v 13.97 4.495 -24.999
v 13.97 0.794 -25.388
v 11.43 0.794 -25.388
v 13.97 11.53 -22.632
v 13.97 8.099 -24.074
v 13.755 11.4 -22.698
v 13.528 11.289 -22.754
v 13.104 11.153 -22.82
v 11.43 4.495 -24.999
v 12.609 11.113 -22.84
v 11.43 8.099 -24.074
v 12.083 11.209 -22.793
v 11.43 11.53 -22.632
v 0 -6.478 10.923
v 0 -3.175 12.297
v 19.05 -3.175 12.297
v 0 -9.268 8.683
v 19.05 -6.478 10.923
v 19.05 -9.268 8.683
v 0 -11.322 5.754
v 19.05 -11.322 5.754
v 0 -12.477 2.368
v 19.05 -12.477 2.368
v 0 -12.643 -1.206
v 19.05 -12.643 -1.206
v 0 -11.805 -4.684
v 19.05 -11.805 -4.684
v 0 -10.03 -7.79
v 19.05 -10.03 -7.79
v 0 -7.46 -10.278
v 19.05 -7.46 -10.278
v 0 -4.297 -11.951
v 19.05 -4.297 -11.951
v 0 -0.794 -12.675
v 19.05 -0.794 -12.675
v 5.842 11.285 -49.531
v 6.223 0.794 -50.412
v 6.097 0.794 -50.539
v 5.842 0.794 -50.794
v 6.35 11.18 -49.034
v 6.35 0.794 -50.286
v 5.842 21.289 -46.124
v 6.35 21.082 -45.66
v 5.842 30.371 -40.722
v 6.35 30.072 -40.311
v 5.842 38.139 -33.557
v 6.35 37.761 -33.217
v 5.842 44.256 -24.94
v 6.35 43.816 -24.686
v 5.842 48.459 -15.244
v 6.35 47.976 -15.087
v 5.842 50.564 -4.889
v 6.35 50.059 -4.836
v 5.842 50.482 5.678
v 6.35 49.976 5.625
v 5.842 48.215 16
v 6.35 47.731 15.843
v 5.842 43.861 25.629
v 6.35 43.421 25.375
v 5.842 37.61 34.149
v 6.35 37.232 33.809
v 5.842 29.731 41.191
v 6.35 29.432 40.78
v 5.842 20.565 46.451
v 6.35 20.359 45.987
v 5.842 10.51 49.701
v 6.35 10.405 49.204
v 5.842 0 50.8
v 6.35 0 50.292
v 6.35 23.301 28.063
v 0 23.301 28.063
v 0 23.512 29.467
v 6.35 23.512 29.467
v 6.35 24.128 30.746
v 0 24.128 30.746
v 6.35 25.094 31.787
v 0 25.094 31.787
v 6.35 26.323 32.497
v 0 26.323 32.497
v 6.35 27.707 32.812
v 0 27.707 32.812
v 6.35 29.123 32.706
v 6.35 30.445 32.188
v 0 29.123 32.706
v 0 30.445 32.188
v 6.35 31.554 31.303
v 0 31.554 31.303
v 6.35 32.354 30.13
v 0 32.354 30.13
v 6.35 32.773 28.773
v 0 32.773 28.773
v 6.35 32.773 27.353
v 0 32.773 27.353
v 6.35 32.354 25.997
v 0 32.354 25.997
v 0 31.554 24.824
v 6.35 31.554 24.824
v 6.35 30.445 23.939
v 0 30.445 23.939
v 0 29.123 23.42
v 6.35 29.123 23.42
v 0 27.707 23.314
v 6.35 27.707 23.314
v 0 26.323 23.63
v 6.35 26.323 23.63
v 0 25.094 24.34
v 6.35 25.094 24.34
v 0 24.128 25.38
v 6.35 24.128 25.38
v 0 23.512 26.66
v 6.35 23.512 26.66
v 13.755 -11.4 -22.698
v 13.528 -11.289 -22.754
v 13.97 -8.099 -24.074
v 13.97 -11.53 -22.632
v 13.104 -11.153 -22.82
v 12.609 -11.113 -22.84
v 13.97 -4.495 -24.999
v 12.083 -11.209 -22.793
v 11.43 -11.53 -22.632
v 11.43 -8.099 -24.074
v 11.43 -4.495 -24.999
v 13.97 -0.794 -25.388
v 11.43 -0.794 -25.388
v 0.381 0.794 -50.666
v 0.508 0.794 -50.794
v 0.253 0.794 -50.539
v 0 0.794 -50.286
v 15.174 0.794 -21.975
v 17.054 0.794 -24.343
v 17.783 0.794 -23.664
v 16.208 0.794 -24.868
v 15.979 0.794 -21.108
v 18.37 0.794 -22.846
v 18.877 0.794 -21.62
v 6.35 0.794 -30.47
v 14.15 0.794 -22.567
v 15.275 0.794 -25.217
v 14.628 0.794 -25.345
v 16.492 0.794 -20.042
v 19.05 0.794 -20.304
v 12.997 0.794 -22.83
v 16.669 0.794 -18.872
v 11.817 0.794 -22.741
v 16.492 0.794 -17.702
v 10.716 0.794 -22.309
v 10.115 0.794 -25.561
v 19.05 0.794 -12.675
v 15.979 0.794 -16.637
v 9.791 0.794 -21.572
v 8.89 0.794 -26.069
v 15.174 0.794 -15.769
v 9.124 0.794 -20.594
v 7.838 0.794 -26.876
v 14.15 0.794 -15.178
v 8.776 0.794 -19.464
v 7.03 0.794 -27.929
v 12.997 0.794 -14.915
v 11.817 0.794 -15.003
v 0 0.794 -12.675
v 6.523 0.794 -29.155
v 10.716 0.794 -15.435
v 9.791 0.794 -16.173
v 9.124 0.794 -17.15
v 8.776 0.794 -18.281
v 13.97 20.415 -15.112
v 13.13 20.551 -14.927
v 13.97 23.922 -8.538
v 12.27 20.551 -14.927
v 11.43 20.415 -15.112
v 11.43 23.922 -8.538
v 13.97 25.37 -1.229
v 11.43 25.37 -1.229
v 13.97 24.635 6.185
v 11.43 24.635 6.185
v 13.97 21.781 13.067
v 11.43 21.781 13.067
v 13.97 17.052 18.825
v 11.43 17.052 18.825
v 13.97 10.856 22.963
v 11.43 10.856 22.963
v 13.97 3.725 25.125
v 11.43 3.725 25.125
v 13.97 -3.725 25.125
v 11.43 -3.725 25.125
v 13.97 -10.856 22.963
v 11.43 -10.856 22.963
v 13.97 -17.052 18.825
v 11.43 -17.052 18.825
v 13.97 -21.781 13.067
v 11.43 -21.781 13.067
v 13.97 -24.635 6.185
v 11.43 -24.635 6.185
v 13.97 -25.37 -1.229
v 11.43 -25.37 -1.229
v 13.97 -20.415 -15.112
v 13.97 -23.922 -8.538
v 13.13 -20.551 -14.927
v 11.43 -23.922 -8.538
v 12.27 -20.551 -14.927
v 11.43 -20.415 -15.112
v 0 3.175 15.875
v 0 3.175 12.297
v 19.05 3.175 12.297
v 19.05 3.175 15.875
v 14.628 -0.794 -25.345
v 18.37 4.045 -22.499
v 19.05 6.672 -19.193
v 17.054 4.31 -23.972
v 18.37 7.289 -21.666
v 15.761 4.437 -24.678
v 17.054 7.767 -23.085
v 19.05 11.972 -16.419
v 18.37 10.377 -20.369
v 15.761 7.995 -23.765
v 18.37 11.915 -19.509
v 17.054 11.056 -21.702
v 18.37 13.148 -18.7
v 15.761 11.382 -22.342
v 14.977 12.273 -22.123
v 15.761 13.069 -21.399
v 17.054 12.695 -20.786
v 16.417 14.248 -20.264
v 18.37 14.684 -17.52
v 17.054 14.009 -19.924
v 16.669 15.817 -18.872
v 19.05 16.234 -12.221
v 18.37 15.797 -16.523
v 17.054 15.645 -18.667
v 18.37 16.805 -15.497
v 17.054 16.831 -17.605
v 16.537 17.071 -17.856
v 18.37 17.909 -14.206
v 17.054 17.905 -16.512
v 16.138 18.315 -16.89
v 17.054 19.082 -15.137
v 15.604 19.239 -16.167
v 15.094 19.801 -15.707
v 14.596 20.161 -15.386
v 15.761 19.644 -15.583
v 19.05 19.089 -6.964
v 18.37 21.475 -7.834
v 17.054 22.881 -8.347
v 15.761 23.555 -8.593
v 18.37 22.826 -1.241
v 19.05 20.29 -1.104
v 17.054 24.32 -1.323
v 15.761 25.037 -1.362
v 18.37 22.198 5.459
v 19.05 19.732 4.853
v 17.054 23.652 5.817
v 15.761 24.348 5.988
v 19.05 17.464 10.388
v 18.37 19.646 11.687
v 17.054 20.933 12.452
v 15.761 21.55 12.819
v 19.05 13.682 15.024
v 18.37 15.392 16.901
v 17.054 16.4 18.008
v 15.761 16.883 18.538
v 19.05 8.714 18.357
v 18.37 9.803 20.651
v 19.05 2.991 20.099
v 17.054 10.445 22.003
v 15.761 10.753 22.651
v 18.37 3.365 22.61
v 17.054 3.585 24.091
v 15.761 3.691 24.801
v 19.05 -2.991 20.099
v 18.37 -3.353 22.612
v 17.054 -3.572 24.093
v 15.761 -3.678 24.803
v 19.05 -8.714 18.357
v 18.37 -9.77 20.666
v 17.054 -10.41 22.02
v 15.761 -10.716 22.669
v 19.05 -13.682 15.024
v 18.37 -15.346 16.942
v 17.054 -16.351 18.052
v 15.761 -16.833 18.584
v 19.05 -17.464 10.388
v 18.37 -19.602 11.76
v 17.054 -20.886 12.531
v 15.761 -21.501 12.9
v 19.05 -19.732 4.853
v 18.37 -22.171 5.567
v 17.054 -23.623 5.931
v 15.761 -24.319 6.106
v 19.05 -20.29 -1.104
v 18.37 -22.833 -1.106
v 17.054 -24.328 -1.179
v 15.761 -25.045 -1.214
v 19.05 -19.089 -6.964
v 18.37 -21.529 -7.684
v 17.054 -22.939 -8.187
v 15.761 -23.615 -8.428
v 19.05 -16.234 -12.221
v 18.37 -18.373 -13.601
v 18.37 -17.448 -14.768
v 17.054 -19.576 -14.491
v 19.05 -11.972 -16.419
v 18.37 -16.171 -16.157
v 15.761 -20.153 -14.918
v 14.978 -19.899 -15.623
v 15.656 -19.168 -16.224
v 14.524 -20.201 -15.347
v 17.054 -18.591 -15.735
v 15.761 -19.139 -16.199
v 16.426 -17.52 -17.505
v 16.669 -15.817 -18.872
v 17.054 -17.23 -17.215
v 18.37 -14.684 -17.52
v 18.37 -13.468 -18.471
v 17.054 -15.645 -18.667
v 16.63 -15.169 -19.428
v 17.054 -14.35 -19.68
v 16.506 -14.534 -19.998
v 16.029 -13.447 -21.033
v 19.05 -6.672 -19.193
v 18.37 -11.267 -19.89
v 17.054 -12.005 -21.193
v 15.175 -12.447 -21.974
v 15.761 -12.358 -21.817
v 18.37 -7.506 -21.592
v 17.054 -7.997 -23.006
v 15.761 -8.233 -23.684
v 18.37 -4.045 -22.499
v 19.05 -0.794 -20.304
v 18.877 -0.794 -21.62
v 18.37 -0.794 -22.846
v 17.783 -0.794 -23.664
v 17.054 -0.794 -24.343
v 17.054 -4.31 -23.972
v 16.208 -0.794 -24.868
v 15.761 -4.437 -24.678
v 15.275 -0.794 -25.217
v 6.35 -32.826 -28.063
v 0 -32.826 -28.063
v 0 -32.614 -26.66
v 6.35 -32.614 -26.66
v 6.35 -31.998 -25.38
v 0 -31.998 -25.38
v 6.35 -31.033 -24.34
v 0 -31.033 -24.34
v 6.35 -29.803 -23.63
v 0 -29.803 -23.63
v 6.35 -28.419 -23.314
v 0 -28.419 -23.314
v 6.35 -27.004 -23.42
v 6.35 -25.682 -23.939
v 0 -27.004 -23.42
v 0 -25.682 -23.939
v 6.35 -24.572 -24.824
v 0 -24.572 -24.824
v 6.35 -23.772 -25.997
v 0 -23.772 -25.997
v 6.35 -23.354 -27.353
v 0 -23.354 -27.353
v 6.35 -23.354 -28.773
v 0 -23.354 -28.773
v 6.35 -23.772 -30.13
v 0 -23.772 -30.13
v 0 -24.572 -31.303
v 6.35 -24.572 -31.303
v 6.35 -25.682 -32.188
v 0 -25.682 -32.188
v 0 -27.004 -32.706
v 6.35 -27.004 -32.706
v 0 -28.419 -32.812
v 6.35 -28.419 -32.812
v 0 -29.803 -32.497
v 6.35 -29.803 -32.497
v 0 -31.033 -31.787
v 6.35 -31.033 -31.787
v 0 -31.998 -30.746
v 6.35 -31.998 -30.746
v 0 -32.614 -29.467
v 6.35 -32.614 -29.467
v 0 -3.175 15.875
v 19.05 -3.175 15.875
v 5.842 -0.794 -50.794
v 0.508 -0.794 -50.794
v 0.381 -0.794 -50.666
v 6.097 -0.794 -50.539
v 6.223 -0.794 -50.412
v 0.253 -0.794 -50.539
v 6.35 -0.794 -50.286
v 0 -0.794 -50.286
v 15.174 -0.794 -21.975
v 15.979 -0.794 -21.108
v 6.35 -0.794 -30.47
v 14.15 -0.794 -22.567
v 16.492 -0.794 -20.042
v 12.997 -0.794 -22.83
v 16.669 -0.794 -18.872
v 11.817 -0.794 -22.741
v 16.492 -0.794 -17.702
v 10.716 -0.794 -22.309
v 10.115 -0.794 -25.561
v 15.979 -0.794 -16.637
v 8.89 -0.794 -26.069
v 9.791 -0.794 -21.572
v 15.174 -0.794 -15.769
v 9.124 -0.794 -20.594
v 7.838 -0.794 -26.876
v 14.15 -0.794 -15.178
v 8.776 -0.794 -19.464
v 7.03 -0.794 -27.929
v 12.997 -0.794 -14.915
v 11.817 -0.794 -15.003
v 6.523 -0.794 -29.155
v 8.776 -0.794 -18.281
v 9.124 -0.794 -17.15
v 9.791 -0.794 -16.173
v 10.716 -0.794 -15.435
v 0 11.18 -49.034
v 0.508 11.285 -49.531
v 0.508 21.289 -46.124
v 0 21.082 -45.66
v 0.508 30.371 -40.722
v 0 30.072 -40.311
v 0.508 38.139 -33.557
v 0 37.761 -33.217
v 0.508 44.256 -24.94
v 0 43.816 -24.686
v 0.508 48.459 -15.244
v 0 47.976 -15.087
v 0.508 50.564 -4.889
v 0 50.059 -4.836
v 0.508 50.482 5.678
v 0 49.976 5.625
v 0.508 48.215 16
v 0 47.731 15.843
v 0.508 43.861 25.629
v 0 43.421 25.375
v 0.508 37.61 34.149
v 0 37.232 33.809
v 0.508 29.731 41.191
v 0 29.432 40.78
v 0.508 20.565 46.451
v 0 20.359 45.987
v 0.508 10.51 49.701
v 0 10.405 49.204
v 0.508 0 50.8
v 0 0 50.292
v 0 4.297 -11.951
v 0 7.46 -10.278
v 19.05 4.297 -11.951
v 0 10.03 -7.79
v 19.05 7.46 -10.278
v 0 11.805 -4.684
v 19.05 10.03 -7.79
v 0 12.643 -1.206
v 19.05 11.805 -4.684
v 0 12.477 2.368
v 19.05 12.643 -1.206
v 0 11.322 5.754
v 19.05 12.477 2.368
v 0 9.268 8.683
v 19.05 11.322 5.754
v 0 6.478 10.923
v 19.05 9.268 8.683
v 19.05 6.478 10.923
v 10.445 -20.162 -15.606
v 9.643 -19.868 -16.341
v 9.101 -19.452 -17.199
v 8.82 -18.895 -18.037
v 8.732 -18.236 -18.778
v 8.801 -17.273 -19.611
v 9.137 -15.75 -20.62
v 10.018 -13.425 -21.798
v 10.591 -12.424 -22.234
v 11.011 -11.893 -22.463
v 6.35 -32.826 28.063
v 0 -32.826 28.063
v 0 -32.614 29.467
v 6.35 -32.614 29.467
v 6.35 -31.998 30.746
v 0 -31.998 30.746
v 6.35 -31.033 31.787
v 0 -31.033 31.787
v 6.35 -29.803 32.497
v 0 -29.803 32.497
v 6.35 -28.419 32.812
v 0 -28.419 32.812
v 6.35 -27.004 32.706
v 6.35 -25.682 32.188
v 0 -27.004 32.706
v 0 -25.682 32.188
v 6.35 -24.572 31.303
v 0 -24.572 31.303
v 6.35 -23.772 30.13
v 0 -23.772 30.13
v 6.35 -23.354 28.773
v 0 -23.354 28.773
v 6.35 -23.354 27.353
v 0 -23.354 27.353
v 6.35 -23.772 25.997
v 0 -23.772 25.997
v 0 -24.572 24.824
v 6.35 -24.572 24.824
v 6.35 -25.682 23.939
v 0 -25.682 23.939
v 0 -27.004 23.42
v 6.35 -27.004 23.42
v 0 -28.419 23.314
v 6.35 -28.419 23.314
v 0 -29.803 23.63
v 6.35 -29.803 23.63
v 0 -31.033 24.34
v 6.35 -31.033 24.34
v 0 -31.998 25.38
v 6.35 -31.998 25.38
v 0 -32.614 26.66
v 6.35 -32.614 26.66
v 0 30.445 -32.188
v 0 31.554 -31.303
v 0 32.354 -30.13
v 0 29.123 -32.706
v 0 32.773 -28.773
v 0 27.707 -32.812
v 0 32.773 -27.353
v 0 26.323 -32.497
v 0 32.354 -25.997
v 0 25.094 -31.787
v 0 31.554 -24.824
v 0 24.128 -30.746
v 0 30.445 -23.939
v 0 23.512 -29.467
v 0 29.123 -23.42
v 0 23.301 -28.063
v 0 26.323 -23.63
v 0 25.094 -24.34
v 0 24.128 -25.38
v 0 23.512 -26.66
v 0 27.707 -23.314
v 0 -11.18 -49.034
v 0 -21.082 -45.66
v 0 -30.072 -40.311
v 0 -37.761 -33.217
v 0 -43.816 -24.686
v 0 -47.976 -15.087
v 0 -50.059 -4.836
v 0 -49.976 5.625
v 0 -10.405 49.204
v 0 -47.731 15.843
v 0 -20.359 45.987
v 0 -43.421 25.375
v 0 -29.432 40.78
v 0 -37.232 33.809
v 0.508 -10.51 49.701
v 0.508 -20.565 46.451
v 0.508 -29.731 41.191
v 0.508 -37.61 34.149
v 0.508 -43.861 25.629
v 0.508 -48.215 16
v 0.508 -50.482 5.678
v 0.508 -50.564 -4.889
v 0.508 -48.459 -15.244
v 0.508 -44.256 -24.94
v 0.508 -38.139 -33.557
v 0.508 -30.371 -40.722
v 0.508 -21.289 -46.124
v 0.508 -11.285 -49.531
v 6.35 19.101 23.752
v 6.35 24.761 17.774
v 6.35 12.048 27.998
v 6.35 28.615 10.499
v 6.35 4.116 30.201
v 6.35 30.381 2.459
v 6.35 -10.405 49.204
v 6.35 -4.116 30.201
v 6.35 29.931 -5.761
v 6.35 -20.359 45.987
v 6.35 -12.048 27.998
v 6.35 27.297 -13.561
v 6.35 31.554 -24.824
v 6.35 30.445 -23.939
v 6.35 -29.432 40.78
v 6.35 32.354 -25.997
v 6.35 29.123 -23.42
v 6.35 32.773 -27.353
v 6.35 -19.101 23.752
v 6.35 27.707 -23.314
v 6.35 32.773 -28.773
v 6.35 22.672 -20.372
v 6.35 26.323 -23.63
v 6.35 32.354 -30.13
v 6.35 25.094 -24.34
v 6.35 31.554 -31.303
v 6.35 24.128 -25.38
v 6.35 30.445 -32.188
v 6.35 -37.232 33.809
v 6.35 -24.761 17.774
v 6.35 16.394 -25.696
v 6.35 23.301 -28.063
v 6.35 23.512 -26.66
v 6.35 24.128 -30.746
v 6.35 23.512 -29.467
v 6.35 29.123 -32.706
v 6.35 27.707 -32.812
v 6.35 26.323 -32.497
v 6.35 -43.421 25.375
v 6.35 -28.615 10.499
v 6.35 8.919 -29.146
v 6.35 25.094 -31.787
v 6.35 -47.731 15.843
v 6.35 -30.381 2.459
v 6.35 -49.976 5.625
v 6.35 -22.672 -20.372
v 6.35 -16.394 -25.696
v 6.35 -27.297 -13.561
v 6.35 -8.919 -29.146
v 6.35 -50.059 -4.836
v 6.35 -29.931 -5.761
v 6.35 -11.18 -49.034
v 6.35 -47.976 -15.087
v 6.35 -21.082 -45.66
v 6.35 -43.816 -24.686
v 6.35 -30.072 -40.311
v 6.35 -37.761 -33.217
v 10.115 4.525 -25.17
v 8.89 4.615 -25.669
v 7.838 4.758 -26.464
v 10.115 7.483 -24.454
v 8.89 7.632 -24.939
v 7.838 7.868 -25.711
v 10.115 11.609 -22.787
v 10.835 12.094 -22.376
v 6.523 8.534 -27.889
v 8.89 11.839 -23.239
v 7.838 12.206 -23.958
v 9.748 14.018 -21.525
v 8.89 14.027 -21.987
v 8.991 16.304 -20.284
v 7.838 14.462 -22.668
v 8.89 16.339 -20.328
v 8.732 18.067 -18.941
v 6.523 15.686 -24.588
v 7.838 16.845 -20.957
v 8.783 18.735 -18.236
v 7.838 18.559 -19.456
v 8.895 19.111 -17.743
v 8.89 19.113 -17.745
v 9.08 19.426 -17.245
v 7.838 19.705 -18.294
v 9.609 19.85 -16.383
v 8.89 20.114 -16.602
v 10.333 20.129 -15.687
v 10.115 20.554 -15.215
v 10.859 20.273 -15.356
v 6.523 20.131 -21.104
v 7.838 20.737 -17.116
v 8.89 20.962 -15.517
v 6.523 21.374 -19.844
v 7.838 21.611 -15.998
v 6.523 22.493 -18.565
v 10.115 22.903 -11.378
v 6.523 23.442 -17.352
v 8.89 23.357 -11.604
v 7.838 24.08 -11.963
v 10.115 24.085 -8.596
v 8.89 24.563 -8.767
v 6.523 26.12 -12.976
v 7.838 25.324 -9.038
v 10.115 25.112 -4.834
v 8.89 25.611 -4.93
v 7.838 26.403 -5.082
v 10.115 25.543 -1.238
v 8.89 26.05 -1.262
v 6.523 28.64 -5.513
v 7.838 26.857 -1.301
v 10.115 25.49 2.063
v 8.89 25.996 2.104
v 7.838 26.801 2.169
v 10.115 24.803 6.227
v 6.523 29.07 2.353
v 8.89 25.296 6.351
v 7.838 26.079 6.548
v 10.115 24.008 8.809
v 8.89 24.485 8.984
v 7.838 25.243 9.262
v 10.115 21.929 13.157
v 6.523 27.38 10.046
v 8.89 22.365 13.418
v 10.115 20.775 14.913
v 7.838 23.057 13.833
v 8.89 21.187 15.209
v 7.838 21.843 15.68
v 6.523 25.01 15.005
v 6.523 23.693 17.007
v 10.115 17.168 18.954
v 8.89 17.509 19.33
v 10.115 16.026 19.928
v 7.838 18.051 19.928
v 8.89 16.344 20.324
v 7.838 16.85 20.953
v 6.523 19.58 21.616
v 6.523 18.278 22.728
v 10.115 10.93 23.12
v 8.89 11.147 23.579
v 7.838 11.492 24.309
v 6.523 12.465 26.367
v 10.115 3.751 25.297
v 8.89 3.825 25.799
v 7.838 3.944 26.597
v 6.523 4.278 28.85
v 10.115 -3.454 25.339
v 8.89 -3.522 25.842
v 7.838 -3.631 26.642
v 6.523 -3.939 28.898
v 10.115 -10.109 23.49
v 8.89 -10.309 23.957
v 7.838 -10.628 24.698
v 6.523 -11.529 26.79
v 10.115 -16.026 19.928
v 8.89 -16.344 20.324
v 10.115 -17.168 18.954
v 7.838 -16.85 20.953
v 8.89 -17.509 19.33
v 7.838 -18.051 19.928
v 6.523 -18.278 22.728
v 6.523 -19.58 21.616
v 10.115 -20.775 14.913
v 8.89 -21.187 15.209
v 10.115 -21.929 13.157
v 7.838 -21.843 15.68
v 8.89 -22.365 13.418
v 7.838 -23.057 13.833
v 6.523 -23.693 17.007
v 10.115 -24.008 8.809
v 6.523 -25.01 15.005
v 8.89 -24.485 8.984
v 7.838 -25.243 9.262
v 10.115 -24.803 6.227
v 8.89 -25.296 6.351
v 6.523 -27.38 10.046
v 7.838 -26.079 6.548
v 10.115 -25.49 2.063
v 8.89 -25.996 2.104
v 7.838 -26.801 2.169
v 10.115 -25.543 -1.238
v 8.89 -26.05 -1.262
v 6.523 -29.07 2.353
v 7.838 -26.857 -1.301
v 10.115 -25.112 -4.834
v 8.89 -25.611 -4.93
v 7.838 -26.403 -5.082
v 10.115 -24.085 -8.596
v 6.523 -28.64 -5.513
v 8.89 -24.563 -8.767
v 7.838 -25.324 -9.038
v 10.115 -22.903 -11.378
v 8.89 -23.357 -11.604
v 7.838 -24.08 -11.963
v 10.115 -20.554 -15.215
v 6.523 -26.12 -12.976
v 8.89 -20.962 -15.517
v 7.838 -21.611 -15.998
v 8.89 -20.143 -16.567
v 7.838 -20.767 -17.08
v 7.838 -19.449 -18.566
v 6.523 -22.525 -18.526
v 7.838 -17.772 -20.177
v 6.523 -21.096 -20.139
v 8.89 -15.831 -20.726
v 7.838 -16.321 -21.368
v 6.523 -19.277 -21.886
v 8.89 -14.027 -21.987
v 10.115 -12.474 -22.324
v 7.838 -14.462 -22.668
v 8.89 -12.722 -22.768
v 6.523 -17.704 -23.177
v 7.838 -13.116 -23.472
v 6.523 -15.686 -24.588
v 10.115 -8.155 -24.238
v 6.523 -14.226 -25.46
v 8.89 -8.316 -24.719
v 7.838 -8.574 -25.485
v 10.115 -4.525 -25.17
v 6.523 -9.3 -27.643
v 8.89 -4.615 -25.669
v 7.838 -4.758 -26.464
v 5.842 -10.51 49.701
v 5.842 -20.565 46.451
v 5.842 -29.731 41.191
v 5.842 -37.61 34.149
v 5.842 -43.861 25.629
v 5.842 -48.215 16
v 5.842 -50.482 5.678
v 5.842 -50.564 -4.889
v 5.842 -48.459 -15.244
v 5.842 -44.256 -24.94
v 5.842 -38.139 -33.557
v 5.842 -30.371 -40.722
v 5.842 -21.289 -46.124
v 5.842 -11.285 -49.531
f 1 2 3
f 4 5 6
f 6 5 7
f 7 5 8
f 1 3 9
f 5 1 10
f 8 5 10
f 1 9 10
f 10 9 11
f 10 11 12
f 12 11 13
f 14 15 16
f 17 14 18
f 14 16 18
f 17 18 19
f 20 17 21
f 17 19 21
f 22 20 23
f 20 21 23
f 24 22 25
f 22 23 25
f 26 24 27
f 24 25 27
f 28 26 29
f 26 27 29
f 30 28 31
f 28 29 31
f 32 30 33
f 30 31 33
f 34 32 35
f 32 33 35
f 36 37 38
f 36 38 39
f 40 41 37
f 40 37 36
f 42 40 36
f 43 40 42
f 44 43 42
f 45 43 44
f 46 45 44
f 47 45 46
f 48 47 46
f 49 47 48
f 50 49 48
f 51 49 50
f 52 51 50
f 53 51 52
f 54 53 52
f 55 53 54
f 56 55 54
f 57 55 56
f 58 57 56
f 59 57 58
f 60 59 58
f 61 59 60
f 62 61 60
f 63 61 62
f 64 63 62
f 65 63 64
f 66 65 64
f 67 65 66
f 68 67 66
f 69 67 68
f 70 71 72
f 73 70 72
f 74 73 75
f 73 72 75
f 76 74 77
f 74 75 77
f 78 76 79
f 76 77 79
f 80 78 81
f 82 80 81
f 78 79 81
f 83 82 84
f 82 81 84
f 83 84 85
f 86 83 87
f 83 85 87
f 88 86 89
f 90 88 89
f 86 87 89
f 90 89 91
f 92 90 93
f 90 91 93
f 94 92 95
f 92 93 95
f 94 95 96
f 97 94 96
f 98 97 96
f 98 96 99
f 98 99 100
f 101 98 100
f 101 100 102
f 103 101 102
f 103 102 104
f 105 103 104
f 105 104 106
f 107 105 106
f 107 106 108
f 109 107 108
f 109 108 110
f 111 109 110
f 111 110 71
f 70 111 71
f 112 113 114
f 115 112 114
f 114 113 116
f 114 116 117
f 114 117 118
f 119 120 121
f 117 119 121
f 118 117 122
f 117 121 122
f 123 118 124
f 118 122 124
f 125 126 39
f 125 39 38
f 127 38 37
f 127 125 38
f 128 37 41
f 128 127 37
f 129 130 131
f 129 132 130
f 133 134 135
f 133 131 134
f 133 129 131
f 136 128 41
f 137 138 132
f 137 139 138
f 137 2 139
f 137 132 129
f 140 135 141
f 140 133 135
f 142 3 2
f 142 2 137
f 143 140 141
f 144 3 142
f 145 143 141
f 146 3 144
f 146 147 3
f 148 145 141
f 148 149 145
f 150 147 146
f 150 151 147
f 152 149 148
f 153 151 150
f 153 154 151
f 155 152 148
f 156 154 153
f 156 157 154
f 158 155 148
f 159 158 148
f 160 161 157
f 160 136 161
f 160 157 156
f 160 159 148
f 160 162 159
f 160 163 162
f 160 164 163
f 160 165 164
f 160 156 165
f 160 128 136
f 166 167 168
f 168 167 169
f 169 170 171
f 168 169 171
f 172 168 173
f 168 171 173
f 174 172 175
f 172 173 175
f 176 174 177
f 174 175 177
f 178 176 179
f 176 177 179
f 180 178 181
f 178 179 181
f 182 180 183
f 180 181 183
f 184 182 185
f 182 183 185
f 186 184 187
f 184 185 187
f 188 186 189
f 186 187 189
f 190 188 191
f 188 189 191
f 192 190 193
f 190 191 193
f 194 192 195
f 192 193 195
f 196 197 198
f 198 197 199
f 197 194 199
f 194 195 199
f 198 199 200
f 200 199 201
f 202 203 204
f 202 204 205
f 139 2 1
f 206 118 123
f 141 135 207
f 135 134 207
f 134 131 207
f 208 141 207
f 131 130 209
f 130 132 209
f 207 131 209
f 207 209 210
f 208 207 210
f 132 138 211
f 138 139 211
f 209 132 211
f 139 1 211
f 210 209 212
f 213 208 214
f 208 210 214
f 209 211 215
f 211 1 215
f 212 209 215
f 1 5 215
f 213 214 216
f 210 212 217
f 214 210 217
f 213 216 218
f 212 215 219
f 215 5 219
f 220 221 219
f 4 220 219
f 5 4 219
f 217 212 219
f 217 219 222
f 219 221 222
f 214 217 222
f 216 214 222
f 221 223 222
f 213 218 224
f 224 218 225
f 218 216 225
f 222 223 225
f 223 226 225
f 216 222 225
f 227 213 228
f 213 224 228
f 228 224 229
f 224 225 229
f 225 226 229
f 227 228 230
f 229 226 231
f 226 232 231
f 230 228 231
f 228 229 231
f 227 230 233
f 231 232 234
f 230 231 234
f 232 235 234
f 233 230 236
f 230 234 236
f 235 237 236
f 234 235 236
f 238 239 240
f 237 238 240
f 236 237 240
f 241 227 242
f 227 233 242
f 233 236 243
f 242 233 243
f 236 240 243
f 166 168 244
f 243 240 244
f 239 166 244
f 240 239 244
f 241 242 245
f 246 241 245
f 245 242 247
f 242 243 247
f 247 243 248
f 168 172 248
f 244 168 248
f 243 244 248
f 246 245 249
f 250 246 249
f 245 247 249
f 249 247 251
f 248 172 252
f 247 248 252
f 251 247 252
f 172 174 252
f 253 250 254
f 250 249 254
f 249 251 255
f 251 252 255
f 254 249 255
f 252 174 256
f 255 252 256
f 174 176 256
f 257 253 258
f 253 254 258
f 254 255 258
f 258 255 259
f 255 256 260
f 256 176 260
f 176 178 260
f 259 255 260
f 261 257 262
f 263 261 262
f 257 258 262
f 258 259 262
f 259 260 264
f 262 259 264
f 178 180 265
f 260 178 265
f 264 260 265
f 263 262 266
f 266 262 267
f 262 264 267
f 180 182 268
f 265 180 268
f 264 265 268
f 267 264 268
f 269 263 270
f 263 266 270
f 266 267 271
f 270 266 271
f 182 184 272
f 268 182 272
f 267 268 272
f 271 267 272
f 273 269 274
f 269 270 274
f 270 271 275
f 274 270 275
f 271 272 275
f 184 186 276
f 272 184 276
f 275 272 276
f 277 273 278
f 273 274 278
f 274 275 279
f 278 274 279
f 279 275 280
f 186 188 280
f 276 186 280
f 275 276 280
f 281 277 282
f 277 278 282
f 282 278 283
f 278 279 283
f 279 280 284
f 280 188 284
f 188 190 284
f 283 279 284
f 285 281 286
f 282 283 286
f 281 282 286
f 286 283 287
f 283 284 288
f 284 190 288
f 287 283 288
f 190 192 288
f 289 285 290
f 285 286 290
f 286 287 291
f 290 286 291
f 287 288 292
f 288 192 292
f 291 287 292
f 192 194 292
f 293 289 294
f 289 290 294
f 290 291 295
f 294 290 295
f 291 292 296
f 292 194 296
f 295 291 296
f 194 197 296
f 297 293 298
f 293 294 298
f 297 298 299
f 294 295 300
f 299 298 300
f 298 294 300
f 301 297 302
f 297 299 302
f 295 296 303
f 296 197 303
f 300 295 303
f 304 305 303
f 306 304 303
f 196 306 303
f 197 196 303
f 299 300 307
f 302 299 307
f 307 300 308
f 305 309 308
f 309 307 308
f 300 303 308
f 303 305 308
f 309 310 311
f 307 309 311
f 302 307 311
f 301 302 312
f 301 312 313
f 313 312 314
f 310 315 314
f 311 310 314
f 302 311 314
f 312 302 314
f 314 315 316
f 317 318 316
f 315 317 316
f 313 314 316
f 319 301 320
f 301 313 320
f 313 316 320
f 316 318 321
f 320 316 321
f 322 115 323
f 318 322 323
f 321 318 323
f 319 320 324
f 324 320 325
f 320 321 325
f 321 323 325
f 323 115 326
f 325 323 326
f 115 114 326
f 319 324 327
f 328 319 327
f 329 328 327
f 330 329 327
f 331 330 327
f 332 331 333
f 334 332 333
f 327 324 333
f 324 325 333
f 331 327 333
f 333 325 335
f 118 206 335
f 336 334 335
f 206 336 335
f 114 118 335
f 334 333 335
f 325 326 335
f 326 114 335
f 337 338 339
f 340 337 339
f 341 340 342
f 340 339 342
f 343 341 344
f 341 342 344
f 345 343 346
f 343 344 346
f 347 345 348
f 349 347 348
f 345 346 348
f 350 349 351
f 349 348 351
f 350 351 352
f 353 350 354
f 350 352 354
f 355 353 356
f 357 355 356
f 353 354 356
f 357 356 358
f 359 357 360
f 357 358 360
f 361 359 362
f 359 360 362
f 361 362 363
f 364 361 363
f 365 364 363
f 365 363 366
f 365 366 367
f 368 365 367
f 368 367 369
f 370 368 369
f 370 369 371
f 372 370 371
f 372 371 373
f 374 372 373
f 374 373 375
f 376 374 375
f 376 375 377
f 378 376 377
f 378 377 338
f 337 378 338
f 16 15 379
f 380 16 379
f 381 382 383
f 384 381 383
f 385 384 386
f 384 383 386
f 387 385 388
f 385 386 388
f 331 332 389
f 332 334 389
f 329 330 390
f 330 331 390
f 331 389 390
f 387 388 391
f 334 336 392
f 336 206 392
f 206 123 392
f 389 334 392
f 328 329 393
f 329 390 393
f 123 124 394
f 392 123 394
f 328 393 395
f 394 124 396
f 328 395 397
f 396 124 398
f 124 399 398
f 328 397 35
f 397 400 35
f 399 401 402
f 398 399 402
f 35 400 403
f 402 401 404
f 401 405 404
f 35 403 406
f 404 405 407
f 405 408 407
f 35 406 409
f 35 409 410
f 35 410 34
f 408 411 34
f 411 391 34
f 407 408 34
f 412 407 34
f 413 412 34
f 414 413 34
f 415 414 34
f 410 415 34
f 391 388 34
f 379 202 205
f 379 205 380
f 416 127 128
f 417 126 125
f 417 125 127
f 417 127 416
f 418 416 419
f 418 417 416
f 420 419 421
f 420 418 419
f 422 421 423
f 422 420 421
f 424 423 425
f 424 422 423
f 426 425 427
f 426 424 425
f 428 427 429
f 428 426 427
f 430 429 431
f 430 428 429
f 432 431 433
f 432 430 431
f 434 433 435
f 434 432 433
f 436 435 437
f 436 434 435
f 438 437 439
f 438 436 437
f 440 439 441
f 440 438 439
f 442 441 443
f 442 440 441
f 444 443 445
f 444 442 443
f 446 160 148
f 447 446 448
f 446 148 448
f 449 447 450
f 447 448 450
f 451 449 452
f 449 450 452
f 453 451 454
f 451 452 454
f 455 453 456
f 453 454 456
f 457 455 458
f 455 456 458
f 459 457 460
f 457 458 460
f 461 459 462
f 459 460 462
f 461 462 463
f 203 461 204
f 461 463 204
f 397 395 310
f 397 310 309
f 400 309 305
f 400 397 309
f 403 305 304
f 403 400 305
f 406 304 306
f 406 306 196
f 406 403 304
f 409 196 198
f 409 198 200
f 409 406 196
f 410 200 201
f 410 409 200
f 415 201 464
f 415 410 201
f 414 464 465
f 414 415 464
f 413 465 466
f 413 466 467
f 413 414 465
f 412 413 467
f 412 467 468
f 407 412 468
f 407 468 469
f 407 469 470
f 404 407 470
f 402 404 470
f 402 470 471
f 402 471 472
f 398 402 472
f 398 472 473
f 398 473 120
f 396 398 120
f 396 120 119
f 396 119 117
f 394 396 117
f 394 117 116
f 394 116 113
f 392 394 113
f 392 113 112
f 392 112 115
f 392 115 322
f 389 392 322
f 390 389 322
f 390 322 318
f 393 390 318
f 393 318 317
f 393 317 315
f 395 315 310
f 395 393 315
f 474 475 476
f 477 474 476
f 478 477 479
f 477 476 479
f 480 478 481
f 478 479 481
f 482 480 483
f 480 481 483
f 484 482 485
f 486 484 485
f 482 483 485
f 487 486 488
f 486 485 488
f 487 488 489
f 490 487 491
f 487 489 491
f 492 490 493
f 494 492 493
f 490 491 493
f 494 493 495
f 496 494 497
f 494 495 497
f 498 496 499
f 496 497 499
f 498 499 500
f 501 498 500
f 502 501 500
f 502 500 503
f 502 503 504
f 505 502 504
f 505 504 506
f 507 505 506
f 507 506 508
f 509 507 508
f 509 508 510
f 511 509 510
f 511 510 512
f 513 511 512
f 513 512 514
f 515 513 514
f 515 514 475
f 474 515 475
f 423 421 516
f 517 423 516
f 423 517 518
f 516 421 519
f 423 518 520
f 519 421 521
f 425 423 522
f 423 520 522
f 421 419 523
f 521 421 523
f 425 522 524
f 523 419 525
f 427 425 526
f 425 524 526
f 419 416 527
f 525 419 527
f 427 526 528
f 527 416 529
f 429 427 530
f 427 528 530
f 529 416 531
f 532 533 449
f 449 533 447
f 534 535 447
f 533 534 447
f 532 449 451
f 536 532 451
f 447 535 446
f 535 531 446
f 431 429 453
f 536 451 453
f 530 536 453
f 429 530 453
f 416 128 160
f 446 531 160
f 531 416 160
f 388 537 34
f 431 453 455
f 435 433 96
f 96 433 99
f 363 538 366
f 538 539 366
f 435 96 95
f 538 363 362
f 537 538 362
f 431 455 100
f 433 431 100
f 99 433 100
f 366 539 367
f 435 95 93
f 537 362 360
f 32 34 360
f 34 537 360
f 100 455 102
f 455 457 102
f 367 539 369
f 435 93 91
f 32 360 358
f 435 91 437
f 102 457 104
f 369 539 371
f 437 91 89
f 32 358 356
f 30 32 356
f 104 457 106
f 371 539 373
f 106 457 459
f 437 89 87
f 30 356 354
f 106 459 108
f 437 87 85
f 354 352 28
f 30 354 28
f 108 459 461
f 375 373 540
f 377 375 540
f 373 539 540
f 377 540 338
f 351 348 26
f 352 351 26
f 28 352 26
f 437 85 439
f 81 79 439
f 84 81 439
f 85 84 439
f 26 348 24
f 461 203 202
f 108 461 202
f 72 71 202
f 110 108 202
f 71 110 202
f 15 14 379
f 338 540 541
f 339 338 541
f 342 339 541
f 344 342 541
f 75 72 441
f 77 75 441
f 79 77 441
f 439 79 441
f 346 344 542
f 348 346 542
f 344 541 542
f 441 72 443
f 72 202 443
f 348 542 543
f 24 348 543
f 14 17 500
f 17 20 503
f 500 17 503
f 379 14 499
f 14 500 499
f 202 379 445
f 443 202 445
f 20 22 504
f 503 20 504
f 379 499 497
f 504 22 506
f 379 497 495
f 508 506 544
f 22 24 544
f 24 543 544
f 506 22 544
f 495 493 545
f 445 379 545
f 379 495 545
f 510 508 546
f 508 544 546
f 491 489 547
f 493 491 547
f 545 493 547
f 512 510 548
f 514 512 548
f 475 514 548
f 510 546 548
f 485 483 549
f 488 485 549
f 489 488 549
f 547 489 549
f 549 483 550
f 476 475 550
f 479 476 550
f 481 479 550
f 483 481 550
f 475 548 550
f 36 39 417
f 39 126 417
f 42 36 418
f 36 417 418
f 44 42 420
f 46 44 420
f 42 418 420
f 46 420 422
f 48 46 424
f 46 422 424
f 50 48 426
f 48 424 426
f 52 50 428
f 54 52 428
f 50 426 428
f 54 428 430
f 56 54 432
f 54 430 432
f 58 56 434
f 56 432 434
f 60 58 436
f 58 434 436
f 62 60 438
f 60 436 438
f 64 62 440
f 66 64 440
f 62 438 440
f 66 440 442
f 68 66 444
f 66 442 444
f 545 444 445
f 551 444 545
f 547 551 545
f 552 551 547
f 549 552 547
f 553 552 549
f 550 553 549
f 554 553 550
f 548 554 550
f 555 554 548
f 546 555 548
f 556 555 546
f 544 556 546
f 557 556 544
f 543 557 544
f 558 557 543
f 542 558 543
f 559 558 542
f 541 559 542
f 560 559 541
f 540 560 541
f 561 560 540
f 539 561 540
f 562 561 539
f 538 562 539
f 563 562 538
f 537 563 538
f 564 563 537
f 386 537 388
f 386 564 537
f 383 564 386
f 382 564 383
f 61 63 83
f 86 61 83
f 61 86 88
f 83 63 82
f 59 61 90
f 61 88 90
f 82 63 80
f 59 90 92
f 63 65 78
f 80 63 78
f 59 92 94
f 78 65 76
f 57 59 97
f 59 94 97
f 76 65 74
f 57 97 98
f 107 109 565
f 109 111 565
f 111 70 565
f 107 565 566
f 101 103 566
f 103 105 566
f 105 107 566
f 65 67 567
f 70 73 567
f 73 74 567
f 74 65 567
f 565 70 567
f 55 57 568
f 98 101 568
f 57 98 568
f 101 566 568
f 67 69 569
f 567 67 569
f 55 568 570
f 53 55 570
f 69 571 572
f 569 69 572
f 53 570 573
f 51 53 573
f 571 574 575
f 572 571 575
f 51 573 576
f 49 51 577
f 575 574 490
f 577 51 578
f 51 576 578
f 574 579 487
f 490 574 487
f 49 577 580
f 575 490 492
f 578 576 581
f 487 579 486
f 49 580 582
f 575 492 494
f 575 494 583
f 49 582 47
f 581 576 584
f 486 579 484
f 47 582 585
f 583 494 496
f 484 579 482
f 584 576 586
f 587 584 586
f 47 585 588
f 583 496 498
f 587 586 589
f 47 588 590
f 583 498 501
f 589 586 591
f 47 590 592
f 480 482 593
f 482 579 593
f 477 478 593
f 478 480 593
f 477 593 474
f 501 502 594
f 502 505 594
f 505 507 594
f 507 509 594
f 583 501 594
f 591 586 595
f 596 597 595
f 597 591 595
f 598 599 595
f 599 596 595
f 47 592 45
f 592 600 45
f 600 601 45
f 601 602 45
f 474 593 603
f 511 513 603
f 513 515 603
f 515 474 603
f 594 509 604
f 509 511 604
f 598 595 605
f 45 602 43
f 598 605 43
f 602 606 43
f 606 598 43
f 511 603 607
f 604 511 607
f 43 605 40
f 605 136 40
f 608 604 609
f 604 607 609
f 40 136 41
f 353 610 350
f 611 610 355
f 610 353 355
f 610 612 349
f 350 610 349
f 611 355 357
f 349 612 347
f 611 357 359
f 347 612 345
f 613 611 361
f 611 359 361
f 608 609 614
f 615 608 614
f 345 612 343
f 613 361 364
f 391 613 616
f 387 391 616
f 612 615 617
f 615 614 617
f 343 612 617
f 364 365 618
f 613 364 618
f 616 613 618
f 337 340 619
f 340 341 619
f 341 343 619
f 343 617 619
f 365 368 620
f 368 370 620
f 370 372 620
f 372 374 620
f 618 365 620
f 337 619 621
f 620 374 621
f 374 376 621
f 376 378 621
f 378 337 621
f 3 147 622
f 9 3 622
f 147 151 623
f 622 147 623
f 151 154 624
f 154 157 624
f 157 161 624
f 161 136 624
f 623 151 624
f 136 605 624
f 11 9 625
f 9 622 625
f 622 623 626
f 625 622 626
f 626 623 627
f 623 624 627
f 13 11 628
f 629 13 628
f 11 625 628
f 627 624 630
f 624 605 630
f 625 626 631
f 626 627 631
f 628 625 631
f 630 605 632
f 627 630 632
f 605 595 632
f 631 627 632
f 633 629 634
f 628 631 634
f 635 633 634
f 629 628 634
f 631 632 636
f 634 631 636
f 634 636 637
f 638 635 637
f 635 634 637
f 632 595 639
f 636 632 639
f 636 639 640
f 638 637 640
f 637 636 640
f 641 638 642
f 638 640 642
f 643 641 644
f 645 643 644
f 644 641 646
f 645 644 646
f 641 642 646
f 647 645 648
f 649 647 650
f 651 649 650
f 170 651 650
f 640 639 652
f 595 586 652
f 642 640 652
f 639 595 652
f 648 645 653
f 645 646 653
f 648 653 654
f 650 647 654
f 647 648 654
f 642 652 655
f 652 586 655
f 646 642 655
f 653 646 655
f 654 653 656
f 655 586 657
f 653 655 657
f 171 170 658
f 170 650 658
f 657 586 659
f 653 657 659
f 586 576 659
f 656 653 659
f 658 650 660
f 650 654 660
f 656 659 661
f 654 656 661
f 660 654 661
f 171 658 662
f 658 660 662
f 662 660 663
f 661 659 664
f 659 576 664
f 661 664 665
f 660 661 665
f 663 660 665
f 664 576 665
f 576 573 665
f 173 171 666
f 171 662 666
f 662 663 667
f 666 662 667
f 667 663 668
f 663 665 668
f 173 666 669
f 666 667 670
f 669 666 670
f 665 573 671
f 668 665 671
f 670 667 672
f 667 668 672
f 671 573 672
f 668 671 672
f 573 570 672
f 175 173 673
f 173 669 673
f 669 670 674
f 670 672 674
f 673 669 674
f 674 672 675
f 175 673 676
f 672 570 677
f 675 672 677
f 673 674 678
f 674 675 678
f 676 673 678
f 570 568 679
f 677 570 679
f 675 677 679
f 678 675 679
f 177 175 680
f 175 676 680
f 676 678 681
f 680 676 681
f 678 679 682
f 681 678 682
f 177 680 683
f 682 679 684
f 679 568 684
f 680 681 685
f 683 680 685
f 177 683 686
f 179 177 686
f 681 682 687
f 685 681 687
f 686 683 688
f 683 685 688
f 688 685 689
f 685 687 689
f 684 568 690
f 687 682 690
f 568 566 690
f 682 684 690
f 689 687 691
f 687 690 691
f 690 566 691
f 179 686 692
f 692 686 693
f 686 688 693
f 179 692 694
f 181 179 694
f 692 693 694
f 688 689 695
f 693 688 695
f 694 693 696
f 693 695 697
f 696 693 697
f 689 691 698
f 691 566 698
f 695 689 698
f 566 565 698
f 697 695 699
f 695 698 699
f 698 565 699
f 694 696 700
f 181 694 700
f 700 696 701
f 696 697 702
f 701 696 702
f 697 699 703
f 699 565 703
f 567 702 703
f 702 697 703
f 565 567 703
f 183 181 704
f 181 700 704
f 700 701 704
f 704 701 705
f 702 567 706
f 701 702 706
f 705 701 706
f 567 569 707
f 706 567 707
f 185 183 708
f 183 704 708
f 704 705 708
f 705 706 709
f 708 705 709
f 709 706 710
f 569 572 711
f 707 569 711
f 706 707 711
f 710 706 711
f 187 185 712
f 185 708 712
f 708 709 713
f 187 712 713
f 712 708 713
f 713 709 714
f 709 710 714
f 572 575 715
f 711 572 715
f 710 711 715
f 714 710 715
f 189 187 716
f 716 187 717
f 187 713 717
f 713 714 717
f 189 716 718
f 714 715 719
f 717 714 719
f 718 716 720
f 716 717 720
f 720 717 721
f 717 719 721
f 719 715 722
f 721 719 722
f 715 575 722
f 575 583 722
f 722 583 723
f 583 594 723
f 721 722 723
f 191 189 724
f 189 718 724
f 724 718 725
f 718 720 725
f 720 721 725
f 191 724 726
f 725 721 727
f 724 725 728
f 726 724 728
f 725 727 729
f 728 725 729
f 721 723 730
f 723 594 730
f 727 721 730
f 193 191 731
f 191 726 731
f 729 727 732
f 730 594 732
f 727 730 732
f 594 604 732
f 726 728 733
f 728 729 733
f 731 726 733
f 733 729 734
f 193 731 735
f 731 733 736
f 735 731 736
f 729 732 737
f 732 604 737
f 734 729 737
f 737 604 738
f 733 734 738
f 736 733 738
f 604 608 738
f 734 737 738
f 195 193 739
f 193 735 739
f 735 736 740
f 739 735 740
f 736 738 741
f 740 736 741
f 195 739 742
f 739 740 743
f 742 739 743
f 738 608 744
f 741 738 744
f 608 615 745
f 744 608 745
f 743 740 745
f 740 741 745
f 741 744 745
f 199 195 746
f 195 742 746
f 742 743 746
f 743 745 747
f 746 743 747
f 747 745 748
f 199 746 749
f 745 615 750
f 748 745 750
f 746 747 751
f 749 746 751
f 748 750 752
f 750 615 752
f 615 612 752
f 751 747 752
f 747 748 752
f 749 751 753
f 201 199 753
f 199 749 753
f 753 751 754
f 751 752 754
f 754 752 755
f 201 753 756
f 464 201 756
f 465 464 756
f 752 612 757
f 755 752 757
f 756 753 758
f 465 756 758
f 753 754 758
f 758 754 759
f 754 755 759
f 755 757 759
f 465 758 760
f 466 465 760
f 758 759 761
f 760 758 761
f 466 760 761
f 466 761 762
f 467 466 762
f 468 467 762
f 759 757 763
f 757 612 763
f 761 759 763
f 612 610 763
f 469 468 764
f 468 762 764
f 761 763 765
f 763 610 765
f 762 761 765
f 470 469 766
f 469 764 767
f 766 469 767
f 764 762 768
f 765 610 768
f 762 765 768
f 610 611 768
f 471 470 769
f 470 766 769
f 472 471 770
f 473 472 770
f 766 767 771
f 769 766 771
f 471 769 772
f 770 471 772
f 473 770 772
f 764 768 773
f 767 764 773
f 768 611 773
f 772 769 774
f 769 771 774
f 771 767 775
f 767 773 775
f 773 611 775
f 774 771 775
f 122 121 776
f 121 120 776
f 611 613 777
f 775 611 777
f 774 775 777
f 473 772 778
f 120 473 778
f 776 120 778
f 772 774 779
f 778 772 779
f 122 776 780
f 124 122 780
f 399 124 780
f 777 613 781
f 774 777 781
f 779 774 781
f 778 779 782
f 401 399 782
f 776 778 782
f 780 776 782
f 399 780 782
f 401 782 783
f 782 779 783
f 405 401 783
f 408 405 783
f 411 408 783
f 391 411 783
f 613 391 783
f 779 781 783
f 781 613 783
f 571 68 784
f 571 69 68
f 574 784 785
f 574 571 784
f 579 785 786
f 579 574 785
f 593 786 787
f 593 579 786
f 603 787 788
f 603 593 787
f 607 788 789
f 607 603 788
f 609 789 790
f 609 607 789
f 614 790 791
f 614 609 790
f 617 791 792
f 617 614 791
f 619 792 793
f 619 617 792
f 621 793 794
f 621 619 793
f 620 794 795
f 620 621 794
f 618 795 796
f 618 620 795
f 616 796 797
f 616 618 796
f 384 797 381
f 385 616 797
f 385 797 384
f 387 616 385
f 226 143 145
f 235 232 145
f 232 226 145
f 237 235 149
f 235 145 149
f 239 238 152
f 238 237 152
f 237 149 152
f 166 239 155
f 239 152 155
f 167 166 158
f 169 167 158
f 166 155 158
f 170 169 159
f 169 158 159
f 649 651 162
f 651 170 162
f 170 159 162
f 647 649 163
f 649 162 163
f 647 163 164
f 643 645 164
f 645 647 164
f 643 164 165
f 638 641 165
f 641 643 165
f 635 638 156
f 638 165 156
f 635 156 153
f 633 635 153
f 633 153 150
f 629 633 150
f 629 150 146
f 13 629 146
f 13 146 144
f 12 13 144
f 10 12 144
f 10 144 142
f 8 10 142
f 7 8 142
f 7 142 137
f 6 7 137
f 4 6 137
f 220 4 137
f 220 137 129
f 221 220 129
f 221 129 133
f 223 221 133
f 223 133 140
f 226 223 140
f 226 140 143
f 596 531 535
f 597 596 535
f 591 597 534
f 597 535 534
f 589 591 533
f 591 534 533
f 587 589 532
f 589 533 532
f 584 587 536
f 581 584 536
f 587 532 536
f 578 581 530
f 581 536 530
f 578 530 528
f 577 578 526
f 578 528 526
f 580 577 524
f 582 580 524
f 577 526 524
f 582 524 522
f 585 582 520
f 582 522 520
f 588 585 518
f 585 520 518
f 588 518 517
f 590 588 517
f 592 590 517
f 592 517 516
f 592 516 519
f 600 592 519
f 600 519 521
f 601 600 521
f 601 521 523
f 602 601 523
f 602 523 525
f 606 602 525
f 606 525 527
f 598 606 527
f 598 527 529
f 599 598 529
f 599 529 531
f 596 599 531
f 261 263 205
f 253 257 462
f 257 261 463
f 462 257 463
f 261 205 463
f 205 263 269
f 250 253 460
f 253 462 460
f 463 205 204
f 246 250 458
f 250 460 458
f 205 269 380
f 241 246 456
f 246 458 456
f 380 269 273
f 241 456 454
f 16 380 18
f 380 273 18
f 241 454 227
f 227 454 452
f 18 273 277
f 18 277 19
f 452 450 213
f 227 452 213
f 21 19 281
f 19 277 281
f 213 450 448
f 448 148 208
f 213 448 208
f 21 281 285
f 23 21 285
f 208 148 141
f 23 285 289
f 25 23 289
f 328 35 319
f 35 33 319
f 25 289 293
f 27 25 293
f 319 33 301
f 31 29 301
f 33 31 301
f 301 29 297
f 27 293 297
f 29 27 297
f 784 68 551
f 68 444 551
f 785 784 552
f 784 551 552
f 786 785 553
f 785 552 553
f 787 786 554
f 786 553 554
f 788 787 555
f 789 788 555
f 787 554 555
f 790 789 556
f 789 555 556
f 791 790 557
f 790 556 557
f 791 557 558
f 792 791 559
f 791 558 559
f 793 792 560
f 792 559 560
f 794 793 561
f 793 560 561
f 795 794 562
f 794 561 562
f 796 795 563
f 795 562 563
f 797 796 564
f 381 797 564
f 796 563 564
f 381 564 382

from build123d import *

# Parameters (mm, degrees)
F2_R          = 5.08
F3_SIZE       = 0.508
F4_R          = 4.7625
F4_W          = 6.35
F4_H          = 6.35
F4_W_2        = 1.5875
F4_H_2        = 60.4483003783
F5_DEPTH      = 19.051
F6_R          = 3.96875
F7_DEPTH      = 50.801
F7_DEPTH_BACK = 50.801


with BuildPart() as f1:
    # F0 (on Front) → F1 (revolve)
    with BuildSketch(Plane.XZ):
        Polygon((0, 50.8), (0, 12.7), (19.05, 12.7), (19.05, 25.4), (6.35, 25.4), (6.35, 50.8), align=None)
    revolve(axis=Axis((9.525, 0, 0), (1, 0, 0)))

    # F2
    f2_edges = [f1.edges().sort_by_distance(p)[0] for p in [
        (19.05, 0, -25.4),
        (6.35, 0, -25.4),
    ]]
    fillet(f2_edges, radius=F2_R)

    # F3
    f3_edges = [f1.edges().sort_by_distance(p)[0] for p in [
        (6.35, 0, -50.8),
        (0, 0, -50.8),
    ]]
    chamfer(f3_edges, length=F3_SIZE)

    # F4 (on face) → F5 (cut, through all)
    with BuildSketch(Plane(origin=(0, 0, 0), x_dir=(0, -1, 0), z_dir=(-1, 0, 0))):
        with Locations((-28.0633003783, 28.0633003783)):
            Circle(F4_R)
        with Locations((-28.0633003783, -28.0633003783)):
            Circle(F4_R)
        with Locations((28.0633003783, -28.0633003783)):
            Circle(F4_R)
        with Locations((28.0633003783, 28.0633003783)):
            Circle(F4_R)
        with Locations((0, 12.7)):
            Rectangle(F4_W, F4_H)
        with Locations((0, -23.2391501892)):
            Rectangle(F4_W_2, F4_H_2)
    extrude(amount=-F5_DEPTH, mode=Mode.SUBTRACT)

    # F6 (on Front) → F7 (cut, two sides)
    with BuildSketch(Plane.XZ) as f7_sk:
        with Locations((12.7, -18.8722)):
            Circle(F6_R)
    extrude(amount=-F7_DEPTH, mode=Mode.SUBTRACT)
    extrude(f7_sk.sketch, amount=F7_DEPTH_BACK, mode=Mode.SUBTRACT)


solid = f1.part
